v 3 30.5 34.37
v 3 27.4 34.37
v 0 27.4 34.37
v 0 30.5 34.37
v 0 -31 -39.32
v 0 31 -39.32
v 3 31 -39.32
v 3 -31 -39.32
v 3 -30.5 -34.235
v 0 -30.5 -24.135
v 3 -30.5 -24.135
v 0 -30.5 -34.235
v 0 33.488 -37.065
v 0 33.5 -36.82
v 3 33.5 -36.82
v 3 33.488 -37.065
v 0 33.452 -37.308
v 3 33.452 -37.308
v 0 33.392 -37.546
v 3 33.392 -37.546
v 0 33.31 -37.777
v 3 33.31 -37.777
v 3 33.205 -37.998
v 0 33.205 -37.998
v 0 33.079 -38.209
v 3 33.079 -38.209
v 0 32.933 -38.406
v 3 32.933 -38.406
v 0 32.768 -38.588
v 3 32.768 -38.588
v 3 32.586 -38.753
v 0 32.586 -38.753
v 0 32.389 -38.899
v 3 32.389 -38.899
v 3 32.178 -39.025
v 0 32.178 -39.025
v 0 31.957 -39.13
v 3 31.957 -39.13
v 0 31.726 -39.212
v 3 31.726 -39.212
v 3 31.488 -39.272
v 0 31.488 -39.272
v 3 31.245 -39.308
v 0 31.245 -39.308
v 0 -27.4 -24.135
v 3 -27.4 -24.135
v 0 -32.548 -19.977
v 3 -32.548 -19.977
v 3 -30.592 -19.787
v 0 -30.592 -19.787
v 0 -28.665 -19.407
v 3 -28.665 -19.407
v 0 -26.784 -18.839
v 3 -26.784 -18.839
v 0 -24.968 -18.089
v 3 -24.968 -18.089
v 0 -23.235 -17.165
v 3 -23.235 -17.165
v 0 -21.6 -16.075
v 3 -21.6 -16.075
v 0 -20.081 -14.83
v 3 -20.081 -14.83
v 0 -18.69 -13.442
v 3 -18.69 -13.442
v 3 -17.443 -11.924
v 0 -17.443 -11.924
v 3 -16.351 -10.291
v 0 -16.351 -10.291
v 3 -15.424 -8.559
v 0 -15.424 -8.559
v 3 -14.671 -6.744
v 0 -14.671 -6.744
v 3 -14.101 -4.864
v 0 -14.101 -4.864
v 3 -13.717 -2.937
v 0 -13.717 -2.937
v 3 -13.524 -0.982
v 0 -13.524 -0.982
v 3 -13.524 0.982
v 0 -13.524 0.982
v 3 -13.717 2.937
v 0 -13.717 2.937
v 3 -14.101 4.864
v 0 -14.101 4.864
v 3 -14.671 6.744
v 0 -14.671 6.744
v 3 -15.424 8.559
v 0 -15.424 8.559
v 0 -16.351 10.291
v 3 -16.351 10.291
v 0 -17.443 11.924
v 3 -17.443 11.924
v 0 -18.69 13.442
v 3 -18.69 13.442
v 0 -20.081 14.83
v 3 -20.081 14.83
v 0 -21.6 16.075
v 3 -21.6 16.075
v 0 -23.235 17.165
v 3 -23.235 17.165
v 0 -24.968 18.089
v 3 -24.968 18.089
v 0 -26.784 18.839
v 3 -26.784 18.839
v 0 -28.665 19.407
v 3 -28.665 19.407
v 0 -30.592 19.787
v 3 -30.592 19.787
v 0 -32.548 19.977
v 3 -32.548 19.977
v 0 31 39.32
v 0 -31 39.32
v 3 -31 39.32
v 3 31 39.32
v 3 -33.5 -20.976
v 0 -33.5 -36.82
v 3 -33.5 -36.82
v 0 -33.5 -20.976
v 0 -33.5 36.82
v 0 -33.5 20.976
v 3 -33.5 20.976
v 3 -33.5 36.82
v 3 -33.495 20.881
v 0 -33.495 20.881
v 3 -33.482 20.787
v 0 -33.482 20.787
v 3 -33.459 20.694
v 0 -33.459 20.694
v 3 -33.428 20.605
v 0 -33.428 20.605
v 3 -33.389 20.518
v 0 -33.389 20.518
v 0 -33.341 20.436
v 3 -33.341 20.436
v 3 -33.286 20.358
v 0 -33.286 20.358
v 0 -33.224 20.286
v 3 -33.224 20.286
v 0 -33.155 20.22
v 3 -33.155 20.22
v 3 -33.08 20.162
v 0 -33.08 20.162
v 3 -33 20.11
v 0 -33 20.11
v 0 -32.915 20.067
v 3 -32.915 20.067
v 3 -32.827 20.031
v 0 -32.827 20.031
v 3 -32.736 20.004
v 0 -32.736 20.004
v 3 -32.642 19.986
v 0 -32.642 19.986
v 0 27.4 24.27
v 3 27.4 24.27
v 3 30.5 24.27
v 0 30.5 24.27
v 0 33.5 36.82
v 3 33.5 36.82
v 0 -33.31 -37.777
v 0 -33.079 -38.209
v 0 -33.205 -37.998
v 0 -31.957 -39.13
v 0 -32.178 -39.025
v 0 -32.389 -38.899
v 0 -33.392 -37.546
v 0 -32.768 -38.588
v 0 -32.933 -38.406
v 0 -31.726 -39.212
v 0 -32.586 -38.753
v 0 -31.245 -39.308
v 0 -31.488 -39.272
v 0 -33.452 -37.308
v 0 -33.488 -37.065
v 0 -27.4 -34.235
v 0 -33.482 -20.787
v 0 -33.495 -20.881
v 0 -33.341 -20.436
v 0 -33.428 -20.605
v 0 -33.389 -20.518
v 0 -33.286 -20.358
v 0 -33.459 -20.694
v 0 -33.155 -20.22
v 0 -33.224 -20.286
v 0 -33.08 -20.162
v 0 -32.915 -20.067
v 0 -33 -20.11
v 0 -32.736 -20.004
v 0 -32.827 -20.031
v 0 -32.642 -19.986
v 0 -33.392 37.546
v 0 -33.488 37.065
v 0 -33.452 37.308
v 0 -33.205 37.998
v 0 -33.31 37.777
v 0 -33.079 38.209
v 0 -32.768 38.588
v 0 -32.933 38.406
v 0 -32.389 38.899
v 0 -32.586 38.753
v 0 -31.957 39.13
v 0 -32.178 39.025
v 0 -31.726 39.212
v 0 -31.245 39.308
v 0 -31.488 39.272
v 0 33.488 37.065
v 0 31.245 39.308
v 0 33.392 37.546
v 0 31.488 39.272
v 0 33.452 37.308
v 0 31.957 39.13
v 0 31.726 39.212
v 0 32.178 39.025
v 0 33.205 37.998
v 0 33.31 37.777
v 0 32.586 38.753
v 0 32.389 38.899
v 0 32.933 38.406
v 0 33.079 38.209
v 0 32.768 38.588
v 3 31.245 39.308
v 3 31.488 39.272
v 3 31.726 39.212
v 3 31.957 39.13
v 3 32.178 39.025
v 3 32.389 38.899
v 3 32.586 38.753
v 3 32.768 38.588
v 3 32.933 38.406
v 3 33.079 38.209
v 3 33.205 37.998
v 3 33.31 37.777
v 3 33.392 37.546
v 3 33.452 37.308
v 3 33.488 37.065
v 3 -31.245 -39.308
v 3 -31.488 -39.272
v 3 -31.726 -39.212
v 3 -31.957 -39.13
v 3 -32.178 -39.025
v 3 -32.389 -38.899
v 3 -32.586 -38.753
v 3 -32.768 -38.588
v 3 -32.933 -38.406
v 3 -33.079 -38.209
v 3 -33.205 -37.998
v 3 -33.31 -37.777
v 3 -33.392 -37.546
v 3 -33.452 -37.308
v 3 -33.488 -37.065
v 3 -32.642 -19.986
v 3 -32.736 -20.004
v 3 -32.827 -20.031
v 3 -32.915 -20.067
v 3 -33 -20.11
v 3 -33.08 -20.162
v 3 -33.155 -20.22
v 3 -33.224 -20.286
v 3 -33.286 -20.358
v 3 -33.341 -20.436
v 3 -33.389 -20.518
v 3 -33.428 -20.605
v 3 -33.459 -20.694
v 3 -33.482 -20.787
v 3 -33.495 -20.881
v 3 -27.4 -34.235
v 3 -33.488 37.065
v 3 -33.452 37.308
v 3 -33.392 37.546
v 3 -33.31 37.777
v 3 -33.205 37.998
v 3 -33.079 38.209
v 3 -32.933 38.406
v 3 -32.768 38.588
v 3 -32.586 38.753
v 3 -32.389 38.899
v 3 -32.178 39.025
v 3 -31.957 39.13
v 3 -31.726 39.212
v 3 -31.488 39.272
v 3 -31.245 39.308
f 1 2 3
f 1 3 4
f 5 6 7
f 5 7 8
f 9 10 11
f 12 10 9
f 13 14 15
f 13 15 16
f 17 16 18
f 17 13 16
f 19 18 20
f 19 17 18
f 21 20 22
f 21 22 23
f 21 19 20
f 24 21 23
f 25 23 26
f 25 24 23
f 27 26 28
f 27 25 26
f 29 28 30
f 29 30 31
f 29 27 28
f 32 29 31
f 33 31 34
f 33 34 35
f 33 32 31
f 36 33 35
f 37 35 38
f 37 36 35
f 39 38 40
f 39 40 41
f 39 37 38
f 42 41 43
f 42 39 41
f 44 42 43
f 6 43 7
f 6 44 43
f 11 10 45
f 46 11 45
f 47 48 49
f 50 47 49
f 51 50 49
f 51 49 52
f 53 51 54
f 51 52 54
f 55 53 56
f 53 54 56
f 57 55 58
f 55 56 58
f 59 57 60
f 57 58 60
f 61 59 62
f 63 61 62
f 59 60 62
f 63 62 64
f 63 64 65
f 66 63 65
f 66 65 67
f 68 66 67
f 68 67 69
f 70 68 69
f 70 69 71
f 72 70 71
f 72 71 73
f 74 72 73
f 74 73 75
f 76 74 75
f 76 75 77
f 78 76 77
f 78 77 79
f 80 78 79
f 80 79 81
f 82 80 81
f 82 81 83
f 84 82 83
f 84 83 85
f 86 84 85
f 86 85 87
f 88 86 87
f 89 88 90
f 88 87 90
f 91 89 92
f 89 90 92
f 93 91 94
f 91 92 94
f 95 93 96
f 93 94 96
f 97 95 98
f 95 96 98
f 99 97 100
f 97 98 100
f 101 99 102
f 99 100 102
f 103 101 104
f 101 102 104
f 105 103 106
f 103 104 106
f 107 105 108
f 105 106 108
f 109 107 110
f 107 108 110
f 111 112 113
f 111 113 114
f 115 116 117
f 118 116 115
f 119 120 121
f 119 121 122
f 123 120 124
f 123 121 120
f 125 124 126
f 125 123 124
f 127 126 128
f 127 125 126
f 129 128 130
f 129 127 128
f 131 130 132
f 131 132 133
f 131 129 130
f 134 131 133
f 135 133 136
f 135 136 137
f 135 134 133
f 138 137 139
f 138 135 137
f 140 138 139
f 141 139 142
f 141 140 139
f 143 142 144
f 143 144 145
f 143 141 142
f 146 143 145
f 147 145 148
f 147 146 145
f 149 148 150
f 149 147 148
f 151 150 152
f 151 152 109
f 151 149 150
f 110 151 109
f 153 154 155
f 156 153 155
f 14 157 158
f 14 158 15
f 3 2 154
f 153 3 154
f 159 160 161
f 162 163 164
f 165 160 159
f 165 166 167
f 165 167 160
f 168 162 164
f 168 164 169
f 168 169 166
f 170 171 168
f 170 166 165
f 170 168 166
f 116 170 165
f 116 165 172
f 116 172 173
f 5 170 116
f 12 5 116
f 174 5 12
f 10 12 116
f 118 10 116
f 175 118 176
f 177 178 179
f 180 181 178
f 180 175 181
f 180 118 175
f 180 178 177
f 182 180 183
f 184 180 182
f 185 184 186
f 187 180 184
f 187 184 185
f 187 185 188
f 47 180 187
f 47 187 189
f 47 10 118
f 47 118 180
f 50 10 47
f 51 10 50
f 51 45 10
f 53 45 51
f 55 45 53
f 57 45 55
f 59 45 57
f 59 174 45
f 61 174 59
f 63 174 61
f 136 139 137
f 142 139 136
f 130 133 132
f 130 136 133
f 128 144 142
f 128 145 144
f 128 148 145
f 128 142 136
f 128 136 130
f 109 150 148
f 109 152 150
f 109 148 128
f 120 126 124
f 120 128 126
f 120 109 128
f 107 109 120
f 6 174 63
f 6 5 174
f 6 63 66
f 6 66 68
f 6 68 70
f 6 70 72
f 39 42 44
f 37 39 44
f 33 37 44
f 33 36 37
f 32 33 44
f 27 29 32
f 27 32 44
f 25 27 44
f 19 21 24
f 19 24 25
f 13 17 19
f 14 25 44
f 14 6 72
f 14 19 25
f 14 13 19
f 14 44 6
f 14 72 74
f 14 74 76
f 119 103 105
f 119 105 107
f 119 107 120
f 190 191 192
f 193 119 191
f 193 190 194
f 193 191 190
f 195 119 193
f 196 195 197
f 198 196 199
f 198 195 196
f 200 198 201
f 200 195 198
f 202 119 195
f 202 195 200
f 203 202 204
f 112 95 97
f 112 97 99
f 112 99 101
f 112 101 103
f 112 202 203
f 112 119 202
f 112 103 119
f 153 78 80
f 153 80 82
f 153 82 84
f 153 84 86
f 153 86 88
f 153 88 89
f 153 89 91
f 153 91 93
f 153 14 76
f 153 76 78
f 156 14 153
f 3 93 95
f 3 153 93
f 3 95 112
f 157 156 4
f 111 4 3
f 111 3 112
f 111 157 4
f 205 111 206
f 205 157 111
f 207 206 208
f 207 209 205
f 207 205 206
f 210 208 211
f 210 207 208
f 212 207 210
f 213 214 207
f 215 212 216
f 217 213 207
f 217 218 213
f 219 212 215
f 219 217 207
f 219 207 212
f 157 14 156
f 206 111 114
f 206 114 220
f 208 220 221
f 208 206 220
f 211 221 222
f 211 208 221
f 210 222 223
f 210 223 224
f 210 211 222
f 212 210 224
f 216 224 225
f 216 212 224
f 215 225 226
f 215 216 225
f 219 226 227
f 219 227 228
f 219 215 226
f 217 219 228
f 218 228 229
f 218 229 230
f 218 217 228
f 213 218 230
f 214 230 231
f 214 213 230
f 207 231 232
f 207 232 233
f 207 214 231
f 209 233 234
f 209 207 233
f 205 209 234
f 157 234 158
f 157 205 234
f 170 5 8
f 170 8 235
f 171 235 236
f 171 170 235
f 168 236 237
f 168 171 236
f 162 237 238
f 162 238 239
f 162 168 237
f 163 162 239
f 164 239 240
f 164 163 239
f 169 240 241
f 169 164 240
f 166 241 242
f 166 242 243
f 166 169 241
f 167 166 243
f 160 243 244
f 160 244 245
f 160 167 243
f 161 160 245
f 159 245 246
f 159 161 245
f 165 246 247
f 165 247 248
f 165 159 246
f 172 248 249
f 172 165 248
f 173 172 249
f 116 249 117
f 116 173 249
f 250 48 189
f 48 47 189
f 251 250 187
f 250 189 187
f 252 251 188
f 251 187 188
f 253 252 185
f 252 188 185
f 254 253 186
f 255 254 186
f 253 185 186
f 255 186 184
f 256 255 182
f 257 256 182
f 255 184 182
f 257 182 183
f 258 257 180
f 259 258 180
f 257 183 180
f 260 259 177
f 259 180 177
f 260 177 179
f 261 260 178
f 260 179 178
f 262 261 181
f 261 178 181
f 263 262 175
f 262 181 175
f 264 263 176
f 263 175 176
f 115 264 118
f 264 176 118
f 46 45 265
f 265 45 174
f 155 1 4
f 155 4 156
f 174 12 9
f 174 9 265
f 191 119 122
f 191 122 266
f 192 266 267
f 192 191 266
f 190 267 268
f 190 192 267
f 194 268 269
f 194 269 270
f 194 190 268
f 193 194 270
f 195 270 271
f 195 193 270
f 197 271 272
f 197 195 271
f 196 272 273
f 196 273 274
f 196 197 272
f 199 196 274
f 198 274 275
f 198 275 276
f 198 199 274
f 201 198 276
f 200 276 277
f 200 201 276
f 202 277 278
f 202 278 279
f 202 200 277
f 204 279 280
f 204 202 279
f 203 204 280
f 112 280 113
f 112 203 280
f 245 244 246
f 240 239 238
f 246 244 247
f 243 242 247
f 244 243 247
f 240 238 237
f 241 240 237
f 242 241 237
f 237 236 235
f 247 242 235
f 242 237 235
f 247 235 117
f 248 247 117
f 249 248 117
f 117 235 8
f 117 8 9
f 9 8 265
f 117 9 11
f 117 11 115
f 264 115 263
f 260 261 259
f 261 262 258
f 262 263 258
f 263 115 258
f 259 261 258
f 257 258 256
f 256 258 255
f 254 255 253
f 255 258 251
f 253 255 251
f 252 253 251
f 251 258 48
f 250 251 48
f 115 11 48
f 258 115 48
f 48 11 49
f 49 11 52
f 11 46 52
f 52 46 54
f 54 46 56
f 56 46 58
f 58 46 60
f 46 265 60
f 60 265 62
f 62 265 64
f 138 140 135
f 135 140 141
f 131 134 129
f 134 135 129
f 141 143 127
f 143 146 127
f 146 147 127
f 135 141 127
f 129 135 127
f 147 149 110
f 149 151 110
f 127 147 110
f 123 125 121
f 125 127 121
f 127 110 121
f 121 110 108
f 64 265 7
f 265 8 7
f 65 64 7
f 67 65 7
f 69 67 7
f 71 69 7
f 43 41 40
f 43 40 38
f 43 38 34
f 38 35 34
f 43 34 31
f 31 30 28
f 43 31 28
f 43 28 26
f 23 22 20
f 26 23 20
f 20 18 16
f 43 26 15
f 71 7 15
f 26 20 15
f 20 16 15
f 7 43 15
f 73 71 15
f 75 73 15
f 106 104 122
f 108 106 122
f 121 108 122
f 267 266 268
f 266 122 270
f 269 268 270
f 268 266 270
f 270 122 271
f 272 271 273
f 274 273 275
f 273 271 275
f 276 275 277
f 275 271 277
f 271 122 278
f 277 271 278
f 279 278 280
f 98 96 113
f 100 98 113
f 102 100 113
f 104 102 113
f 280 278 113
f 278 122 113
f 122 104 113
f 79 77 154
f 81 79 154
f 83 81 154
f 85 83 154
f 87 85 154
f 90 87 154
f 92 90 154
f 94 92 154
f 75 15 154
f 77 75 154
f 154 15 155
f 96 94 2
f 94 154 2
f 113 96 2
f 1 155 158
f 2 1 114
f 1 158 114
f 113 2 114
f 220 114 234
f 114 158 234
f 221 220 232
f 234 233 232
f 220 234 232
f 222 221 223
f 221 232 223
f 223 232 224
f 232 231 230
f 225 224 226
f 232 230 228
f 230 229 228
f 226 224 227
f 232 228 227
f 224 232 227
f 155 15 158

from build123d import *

# Parameters (mm, degrees)
SALIENTE_EXTRUIR1_DEPTH = 3
CROQUIS2_R              = 20
CROQUIS2_W              = 10.1
CROQUIS2_H              = 3.1
CORTAR_EXTRUIR1_DEPTH   = 3
REDONDEO1_R             = 1


with BuildPart() as part:
    # Croquis1 → Saliente-Extruir1 (new body)
    with BuildSketch(Plane(origin=(0, 0, 0), x_dir=(0, 0, -1), z_dir=(1, 0, 0))):
        with BuildLine():
            Line((-36.82, 33.5), (36.82, 33.5))
            ThreePointArc((36.82, 33.5), (38.587766953, 32.767766953), (39.32, 31))
            Line((39.32, 31), (39.32, -31))
            ThreePointArc((39.32, -31), (38.587766953, -32.767766953), (36.82, -33.5))
            Line((36.82, -33.5), (-36.82, -33.5))
            ThreePointArc((-36.82, -33.5), (-38.587766953, -32.767766953), (-39.32, -31))
            Line((-39.32, -31), (-39.32, 31))
            ThreePointArc((-39.32, 31), (-38.587766953, 32.767766953), (-36.82, 33.5))
        make_face()
    extrude(amount=SALIENTE_EXTRUIR1_DEPTH)

    # Croquis2 → Cortar-Extruir1 (cut, symmetric)
    with BuildSketch(Plane(origin=(3, 0, 0), x_dir=(0, 0, -1), z_dir=(1, 0, 0))):
        with Locations((0, -33.5)):
            Circle(CROQUIS2_R)
        with Locations((29.18492387, -28.95)):
            Rectangle(CROQUIS2_W, CROQUIS2_H)
        with Locations((-29.32, 28.95)):
            Rectangle(CROQUIS2_W, CROQUIS2_H)
    extrude(amount=CORTAR_EXTRUIR1_DEPTH, both=True, mode=Mode.SUBTRACT)

    # Redondeo1
    redondeo1_edges = [part.edges().sort_by_distance(p)[0] for p in [
        (1.5, -33.5, 20),
        (1.5, -33.5, -20),
    ]]
    fillet(redondeo1_edges, radius=REDONDEO1_R)


solid = part.part
